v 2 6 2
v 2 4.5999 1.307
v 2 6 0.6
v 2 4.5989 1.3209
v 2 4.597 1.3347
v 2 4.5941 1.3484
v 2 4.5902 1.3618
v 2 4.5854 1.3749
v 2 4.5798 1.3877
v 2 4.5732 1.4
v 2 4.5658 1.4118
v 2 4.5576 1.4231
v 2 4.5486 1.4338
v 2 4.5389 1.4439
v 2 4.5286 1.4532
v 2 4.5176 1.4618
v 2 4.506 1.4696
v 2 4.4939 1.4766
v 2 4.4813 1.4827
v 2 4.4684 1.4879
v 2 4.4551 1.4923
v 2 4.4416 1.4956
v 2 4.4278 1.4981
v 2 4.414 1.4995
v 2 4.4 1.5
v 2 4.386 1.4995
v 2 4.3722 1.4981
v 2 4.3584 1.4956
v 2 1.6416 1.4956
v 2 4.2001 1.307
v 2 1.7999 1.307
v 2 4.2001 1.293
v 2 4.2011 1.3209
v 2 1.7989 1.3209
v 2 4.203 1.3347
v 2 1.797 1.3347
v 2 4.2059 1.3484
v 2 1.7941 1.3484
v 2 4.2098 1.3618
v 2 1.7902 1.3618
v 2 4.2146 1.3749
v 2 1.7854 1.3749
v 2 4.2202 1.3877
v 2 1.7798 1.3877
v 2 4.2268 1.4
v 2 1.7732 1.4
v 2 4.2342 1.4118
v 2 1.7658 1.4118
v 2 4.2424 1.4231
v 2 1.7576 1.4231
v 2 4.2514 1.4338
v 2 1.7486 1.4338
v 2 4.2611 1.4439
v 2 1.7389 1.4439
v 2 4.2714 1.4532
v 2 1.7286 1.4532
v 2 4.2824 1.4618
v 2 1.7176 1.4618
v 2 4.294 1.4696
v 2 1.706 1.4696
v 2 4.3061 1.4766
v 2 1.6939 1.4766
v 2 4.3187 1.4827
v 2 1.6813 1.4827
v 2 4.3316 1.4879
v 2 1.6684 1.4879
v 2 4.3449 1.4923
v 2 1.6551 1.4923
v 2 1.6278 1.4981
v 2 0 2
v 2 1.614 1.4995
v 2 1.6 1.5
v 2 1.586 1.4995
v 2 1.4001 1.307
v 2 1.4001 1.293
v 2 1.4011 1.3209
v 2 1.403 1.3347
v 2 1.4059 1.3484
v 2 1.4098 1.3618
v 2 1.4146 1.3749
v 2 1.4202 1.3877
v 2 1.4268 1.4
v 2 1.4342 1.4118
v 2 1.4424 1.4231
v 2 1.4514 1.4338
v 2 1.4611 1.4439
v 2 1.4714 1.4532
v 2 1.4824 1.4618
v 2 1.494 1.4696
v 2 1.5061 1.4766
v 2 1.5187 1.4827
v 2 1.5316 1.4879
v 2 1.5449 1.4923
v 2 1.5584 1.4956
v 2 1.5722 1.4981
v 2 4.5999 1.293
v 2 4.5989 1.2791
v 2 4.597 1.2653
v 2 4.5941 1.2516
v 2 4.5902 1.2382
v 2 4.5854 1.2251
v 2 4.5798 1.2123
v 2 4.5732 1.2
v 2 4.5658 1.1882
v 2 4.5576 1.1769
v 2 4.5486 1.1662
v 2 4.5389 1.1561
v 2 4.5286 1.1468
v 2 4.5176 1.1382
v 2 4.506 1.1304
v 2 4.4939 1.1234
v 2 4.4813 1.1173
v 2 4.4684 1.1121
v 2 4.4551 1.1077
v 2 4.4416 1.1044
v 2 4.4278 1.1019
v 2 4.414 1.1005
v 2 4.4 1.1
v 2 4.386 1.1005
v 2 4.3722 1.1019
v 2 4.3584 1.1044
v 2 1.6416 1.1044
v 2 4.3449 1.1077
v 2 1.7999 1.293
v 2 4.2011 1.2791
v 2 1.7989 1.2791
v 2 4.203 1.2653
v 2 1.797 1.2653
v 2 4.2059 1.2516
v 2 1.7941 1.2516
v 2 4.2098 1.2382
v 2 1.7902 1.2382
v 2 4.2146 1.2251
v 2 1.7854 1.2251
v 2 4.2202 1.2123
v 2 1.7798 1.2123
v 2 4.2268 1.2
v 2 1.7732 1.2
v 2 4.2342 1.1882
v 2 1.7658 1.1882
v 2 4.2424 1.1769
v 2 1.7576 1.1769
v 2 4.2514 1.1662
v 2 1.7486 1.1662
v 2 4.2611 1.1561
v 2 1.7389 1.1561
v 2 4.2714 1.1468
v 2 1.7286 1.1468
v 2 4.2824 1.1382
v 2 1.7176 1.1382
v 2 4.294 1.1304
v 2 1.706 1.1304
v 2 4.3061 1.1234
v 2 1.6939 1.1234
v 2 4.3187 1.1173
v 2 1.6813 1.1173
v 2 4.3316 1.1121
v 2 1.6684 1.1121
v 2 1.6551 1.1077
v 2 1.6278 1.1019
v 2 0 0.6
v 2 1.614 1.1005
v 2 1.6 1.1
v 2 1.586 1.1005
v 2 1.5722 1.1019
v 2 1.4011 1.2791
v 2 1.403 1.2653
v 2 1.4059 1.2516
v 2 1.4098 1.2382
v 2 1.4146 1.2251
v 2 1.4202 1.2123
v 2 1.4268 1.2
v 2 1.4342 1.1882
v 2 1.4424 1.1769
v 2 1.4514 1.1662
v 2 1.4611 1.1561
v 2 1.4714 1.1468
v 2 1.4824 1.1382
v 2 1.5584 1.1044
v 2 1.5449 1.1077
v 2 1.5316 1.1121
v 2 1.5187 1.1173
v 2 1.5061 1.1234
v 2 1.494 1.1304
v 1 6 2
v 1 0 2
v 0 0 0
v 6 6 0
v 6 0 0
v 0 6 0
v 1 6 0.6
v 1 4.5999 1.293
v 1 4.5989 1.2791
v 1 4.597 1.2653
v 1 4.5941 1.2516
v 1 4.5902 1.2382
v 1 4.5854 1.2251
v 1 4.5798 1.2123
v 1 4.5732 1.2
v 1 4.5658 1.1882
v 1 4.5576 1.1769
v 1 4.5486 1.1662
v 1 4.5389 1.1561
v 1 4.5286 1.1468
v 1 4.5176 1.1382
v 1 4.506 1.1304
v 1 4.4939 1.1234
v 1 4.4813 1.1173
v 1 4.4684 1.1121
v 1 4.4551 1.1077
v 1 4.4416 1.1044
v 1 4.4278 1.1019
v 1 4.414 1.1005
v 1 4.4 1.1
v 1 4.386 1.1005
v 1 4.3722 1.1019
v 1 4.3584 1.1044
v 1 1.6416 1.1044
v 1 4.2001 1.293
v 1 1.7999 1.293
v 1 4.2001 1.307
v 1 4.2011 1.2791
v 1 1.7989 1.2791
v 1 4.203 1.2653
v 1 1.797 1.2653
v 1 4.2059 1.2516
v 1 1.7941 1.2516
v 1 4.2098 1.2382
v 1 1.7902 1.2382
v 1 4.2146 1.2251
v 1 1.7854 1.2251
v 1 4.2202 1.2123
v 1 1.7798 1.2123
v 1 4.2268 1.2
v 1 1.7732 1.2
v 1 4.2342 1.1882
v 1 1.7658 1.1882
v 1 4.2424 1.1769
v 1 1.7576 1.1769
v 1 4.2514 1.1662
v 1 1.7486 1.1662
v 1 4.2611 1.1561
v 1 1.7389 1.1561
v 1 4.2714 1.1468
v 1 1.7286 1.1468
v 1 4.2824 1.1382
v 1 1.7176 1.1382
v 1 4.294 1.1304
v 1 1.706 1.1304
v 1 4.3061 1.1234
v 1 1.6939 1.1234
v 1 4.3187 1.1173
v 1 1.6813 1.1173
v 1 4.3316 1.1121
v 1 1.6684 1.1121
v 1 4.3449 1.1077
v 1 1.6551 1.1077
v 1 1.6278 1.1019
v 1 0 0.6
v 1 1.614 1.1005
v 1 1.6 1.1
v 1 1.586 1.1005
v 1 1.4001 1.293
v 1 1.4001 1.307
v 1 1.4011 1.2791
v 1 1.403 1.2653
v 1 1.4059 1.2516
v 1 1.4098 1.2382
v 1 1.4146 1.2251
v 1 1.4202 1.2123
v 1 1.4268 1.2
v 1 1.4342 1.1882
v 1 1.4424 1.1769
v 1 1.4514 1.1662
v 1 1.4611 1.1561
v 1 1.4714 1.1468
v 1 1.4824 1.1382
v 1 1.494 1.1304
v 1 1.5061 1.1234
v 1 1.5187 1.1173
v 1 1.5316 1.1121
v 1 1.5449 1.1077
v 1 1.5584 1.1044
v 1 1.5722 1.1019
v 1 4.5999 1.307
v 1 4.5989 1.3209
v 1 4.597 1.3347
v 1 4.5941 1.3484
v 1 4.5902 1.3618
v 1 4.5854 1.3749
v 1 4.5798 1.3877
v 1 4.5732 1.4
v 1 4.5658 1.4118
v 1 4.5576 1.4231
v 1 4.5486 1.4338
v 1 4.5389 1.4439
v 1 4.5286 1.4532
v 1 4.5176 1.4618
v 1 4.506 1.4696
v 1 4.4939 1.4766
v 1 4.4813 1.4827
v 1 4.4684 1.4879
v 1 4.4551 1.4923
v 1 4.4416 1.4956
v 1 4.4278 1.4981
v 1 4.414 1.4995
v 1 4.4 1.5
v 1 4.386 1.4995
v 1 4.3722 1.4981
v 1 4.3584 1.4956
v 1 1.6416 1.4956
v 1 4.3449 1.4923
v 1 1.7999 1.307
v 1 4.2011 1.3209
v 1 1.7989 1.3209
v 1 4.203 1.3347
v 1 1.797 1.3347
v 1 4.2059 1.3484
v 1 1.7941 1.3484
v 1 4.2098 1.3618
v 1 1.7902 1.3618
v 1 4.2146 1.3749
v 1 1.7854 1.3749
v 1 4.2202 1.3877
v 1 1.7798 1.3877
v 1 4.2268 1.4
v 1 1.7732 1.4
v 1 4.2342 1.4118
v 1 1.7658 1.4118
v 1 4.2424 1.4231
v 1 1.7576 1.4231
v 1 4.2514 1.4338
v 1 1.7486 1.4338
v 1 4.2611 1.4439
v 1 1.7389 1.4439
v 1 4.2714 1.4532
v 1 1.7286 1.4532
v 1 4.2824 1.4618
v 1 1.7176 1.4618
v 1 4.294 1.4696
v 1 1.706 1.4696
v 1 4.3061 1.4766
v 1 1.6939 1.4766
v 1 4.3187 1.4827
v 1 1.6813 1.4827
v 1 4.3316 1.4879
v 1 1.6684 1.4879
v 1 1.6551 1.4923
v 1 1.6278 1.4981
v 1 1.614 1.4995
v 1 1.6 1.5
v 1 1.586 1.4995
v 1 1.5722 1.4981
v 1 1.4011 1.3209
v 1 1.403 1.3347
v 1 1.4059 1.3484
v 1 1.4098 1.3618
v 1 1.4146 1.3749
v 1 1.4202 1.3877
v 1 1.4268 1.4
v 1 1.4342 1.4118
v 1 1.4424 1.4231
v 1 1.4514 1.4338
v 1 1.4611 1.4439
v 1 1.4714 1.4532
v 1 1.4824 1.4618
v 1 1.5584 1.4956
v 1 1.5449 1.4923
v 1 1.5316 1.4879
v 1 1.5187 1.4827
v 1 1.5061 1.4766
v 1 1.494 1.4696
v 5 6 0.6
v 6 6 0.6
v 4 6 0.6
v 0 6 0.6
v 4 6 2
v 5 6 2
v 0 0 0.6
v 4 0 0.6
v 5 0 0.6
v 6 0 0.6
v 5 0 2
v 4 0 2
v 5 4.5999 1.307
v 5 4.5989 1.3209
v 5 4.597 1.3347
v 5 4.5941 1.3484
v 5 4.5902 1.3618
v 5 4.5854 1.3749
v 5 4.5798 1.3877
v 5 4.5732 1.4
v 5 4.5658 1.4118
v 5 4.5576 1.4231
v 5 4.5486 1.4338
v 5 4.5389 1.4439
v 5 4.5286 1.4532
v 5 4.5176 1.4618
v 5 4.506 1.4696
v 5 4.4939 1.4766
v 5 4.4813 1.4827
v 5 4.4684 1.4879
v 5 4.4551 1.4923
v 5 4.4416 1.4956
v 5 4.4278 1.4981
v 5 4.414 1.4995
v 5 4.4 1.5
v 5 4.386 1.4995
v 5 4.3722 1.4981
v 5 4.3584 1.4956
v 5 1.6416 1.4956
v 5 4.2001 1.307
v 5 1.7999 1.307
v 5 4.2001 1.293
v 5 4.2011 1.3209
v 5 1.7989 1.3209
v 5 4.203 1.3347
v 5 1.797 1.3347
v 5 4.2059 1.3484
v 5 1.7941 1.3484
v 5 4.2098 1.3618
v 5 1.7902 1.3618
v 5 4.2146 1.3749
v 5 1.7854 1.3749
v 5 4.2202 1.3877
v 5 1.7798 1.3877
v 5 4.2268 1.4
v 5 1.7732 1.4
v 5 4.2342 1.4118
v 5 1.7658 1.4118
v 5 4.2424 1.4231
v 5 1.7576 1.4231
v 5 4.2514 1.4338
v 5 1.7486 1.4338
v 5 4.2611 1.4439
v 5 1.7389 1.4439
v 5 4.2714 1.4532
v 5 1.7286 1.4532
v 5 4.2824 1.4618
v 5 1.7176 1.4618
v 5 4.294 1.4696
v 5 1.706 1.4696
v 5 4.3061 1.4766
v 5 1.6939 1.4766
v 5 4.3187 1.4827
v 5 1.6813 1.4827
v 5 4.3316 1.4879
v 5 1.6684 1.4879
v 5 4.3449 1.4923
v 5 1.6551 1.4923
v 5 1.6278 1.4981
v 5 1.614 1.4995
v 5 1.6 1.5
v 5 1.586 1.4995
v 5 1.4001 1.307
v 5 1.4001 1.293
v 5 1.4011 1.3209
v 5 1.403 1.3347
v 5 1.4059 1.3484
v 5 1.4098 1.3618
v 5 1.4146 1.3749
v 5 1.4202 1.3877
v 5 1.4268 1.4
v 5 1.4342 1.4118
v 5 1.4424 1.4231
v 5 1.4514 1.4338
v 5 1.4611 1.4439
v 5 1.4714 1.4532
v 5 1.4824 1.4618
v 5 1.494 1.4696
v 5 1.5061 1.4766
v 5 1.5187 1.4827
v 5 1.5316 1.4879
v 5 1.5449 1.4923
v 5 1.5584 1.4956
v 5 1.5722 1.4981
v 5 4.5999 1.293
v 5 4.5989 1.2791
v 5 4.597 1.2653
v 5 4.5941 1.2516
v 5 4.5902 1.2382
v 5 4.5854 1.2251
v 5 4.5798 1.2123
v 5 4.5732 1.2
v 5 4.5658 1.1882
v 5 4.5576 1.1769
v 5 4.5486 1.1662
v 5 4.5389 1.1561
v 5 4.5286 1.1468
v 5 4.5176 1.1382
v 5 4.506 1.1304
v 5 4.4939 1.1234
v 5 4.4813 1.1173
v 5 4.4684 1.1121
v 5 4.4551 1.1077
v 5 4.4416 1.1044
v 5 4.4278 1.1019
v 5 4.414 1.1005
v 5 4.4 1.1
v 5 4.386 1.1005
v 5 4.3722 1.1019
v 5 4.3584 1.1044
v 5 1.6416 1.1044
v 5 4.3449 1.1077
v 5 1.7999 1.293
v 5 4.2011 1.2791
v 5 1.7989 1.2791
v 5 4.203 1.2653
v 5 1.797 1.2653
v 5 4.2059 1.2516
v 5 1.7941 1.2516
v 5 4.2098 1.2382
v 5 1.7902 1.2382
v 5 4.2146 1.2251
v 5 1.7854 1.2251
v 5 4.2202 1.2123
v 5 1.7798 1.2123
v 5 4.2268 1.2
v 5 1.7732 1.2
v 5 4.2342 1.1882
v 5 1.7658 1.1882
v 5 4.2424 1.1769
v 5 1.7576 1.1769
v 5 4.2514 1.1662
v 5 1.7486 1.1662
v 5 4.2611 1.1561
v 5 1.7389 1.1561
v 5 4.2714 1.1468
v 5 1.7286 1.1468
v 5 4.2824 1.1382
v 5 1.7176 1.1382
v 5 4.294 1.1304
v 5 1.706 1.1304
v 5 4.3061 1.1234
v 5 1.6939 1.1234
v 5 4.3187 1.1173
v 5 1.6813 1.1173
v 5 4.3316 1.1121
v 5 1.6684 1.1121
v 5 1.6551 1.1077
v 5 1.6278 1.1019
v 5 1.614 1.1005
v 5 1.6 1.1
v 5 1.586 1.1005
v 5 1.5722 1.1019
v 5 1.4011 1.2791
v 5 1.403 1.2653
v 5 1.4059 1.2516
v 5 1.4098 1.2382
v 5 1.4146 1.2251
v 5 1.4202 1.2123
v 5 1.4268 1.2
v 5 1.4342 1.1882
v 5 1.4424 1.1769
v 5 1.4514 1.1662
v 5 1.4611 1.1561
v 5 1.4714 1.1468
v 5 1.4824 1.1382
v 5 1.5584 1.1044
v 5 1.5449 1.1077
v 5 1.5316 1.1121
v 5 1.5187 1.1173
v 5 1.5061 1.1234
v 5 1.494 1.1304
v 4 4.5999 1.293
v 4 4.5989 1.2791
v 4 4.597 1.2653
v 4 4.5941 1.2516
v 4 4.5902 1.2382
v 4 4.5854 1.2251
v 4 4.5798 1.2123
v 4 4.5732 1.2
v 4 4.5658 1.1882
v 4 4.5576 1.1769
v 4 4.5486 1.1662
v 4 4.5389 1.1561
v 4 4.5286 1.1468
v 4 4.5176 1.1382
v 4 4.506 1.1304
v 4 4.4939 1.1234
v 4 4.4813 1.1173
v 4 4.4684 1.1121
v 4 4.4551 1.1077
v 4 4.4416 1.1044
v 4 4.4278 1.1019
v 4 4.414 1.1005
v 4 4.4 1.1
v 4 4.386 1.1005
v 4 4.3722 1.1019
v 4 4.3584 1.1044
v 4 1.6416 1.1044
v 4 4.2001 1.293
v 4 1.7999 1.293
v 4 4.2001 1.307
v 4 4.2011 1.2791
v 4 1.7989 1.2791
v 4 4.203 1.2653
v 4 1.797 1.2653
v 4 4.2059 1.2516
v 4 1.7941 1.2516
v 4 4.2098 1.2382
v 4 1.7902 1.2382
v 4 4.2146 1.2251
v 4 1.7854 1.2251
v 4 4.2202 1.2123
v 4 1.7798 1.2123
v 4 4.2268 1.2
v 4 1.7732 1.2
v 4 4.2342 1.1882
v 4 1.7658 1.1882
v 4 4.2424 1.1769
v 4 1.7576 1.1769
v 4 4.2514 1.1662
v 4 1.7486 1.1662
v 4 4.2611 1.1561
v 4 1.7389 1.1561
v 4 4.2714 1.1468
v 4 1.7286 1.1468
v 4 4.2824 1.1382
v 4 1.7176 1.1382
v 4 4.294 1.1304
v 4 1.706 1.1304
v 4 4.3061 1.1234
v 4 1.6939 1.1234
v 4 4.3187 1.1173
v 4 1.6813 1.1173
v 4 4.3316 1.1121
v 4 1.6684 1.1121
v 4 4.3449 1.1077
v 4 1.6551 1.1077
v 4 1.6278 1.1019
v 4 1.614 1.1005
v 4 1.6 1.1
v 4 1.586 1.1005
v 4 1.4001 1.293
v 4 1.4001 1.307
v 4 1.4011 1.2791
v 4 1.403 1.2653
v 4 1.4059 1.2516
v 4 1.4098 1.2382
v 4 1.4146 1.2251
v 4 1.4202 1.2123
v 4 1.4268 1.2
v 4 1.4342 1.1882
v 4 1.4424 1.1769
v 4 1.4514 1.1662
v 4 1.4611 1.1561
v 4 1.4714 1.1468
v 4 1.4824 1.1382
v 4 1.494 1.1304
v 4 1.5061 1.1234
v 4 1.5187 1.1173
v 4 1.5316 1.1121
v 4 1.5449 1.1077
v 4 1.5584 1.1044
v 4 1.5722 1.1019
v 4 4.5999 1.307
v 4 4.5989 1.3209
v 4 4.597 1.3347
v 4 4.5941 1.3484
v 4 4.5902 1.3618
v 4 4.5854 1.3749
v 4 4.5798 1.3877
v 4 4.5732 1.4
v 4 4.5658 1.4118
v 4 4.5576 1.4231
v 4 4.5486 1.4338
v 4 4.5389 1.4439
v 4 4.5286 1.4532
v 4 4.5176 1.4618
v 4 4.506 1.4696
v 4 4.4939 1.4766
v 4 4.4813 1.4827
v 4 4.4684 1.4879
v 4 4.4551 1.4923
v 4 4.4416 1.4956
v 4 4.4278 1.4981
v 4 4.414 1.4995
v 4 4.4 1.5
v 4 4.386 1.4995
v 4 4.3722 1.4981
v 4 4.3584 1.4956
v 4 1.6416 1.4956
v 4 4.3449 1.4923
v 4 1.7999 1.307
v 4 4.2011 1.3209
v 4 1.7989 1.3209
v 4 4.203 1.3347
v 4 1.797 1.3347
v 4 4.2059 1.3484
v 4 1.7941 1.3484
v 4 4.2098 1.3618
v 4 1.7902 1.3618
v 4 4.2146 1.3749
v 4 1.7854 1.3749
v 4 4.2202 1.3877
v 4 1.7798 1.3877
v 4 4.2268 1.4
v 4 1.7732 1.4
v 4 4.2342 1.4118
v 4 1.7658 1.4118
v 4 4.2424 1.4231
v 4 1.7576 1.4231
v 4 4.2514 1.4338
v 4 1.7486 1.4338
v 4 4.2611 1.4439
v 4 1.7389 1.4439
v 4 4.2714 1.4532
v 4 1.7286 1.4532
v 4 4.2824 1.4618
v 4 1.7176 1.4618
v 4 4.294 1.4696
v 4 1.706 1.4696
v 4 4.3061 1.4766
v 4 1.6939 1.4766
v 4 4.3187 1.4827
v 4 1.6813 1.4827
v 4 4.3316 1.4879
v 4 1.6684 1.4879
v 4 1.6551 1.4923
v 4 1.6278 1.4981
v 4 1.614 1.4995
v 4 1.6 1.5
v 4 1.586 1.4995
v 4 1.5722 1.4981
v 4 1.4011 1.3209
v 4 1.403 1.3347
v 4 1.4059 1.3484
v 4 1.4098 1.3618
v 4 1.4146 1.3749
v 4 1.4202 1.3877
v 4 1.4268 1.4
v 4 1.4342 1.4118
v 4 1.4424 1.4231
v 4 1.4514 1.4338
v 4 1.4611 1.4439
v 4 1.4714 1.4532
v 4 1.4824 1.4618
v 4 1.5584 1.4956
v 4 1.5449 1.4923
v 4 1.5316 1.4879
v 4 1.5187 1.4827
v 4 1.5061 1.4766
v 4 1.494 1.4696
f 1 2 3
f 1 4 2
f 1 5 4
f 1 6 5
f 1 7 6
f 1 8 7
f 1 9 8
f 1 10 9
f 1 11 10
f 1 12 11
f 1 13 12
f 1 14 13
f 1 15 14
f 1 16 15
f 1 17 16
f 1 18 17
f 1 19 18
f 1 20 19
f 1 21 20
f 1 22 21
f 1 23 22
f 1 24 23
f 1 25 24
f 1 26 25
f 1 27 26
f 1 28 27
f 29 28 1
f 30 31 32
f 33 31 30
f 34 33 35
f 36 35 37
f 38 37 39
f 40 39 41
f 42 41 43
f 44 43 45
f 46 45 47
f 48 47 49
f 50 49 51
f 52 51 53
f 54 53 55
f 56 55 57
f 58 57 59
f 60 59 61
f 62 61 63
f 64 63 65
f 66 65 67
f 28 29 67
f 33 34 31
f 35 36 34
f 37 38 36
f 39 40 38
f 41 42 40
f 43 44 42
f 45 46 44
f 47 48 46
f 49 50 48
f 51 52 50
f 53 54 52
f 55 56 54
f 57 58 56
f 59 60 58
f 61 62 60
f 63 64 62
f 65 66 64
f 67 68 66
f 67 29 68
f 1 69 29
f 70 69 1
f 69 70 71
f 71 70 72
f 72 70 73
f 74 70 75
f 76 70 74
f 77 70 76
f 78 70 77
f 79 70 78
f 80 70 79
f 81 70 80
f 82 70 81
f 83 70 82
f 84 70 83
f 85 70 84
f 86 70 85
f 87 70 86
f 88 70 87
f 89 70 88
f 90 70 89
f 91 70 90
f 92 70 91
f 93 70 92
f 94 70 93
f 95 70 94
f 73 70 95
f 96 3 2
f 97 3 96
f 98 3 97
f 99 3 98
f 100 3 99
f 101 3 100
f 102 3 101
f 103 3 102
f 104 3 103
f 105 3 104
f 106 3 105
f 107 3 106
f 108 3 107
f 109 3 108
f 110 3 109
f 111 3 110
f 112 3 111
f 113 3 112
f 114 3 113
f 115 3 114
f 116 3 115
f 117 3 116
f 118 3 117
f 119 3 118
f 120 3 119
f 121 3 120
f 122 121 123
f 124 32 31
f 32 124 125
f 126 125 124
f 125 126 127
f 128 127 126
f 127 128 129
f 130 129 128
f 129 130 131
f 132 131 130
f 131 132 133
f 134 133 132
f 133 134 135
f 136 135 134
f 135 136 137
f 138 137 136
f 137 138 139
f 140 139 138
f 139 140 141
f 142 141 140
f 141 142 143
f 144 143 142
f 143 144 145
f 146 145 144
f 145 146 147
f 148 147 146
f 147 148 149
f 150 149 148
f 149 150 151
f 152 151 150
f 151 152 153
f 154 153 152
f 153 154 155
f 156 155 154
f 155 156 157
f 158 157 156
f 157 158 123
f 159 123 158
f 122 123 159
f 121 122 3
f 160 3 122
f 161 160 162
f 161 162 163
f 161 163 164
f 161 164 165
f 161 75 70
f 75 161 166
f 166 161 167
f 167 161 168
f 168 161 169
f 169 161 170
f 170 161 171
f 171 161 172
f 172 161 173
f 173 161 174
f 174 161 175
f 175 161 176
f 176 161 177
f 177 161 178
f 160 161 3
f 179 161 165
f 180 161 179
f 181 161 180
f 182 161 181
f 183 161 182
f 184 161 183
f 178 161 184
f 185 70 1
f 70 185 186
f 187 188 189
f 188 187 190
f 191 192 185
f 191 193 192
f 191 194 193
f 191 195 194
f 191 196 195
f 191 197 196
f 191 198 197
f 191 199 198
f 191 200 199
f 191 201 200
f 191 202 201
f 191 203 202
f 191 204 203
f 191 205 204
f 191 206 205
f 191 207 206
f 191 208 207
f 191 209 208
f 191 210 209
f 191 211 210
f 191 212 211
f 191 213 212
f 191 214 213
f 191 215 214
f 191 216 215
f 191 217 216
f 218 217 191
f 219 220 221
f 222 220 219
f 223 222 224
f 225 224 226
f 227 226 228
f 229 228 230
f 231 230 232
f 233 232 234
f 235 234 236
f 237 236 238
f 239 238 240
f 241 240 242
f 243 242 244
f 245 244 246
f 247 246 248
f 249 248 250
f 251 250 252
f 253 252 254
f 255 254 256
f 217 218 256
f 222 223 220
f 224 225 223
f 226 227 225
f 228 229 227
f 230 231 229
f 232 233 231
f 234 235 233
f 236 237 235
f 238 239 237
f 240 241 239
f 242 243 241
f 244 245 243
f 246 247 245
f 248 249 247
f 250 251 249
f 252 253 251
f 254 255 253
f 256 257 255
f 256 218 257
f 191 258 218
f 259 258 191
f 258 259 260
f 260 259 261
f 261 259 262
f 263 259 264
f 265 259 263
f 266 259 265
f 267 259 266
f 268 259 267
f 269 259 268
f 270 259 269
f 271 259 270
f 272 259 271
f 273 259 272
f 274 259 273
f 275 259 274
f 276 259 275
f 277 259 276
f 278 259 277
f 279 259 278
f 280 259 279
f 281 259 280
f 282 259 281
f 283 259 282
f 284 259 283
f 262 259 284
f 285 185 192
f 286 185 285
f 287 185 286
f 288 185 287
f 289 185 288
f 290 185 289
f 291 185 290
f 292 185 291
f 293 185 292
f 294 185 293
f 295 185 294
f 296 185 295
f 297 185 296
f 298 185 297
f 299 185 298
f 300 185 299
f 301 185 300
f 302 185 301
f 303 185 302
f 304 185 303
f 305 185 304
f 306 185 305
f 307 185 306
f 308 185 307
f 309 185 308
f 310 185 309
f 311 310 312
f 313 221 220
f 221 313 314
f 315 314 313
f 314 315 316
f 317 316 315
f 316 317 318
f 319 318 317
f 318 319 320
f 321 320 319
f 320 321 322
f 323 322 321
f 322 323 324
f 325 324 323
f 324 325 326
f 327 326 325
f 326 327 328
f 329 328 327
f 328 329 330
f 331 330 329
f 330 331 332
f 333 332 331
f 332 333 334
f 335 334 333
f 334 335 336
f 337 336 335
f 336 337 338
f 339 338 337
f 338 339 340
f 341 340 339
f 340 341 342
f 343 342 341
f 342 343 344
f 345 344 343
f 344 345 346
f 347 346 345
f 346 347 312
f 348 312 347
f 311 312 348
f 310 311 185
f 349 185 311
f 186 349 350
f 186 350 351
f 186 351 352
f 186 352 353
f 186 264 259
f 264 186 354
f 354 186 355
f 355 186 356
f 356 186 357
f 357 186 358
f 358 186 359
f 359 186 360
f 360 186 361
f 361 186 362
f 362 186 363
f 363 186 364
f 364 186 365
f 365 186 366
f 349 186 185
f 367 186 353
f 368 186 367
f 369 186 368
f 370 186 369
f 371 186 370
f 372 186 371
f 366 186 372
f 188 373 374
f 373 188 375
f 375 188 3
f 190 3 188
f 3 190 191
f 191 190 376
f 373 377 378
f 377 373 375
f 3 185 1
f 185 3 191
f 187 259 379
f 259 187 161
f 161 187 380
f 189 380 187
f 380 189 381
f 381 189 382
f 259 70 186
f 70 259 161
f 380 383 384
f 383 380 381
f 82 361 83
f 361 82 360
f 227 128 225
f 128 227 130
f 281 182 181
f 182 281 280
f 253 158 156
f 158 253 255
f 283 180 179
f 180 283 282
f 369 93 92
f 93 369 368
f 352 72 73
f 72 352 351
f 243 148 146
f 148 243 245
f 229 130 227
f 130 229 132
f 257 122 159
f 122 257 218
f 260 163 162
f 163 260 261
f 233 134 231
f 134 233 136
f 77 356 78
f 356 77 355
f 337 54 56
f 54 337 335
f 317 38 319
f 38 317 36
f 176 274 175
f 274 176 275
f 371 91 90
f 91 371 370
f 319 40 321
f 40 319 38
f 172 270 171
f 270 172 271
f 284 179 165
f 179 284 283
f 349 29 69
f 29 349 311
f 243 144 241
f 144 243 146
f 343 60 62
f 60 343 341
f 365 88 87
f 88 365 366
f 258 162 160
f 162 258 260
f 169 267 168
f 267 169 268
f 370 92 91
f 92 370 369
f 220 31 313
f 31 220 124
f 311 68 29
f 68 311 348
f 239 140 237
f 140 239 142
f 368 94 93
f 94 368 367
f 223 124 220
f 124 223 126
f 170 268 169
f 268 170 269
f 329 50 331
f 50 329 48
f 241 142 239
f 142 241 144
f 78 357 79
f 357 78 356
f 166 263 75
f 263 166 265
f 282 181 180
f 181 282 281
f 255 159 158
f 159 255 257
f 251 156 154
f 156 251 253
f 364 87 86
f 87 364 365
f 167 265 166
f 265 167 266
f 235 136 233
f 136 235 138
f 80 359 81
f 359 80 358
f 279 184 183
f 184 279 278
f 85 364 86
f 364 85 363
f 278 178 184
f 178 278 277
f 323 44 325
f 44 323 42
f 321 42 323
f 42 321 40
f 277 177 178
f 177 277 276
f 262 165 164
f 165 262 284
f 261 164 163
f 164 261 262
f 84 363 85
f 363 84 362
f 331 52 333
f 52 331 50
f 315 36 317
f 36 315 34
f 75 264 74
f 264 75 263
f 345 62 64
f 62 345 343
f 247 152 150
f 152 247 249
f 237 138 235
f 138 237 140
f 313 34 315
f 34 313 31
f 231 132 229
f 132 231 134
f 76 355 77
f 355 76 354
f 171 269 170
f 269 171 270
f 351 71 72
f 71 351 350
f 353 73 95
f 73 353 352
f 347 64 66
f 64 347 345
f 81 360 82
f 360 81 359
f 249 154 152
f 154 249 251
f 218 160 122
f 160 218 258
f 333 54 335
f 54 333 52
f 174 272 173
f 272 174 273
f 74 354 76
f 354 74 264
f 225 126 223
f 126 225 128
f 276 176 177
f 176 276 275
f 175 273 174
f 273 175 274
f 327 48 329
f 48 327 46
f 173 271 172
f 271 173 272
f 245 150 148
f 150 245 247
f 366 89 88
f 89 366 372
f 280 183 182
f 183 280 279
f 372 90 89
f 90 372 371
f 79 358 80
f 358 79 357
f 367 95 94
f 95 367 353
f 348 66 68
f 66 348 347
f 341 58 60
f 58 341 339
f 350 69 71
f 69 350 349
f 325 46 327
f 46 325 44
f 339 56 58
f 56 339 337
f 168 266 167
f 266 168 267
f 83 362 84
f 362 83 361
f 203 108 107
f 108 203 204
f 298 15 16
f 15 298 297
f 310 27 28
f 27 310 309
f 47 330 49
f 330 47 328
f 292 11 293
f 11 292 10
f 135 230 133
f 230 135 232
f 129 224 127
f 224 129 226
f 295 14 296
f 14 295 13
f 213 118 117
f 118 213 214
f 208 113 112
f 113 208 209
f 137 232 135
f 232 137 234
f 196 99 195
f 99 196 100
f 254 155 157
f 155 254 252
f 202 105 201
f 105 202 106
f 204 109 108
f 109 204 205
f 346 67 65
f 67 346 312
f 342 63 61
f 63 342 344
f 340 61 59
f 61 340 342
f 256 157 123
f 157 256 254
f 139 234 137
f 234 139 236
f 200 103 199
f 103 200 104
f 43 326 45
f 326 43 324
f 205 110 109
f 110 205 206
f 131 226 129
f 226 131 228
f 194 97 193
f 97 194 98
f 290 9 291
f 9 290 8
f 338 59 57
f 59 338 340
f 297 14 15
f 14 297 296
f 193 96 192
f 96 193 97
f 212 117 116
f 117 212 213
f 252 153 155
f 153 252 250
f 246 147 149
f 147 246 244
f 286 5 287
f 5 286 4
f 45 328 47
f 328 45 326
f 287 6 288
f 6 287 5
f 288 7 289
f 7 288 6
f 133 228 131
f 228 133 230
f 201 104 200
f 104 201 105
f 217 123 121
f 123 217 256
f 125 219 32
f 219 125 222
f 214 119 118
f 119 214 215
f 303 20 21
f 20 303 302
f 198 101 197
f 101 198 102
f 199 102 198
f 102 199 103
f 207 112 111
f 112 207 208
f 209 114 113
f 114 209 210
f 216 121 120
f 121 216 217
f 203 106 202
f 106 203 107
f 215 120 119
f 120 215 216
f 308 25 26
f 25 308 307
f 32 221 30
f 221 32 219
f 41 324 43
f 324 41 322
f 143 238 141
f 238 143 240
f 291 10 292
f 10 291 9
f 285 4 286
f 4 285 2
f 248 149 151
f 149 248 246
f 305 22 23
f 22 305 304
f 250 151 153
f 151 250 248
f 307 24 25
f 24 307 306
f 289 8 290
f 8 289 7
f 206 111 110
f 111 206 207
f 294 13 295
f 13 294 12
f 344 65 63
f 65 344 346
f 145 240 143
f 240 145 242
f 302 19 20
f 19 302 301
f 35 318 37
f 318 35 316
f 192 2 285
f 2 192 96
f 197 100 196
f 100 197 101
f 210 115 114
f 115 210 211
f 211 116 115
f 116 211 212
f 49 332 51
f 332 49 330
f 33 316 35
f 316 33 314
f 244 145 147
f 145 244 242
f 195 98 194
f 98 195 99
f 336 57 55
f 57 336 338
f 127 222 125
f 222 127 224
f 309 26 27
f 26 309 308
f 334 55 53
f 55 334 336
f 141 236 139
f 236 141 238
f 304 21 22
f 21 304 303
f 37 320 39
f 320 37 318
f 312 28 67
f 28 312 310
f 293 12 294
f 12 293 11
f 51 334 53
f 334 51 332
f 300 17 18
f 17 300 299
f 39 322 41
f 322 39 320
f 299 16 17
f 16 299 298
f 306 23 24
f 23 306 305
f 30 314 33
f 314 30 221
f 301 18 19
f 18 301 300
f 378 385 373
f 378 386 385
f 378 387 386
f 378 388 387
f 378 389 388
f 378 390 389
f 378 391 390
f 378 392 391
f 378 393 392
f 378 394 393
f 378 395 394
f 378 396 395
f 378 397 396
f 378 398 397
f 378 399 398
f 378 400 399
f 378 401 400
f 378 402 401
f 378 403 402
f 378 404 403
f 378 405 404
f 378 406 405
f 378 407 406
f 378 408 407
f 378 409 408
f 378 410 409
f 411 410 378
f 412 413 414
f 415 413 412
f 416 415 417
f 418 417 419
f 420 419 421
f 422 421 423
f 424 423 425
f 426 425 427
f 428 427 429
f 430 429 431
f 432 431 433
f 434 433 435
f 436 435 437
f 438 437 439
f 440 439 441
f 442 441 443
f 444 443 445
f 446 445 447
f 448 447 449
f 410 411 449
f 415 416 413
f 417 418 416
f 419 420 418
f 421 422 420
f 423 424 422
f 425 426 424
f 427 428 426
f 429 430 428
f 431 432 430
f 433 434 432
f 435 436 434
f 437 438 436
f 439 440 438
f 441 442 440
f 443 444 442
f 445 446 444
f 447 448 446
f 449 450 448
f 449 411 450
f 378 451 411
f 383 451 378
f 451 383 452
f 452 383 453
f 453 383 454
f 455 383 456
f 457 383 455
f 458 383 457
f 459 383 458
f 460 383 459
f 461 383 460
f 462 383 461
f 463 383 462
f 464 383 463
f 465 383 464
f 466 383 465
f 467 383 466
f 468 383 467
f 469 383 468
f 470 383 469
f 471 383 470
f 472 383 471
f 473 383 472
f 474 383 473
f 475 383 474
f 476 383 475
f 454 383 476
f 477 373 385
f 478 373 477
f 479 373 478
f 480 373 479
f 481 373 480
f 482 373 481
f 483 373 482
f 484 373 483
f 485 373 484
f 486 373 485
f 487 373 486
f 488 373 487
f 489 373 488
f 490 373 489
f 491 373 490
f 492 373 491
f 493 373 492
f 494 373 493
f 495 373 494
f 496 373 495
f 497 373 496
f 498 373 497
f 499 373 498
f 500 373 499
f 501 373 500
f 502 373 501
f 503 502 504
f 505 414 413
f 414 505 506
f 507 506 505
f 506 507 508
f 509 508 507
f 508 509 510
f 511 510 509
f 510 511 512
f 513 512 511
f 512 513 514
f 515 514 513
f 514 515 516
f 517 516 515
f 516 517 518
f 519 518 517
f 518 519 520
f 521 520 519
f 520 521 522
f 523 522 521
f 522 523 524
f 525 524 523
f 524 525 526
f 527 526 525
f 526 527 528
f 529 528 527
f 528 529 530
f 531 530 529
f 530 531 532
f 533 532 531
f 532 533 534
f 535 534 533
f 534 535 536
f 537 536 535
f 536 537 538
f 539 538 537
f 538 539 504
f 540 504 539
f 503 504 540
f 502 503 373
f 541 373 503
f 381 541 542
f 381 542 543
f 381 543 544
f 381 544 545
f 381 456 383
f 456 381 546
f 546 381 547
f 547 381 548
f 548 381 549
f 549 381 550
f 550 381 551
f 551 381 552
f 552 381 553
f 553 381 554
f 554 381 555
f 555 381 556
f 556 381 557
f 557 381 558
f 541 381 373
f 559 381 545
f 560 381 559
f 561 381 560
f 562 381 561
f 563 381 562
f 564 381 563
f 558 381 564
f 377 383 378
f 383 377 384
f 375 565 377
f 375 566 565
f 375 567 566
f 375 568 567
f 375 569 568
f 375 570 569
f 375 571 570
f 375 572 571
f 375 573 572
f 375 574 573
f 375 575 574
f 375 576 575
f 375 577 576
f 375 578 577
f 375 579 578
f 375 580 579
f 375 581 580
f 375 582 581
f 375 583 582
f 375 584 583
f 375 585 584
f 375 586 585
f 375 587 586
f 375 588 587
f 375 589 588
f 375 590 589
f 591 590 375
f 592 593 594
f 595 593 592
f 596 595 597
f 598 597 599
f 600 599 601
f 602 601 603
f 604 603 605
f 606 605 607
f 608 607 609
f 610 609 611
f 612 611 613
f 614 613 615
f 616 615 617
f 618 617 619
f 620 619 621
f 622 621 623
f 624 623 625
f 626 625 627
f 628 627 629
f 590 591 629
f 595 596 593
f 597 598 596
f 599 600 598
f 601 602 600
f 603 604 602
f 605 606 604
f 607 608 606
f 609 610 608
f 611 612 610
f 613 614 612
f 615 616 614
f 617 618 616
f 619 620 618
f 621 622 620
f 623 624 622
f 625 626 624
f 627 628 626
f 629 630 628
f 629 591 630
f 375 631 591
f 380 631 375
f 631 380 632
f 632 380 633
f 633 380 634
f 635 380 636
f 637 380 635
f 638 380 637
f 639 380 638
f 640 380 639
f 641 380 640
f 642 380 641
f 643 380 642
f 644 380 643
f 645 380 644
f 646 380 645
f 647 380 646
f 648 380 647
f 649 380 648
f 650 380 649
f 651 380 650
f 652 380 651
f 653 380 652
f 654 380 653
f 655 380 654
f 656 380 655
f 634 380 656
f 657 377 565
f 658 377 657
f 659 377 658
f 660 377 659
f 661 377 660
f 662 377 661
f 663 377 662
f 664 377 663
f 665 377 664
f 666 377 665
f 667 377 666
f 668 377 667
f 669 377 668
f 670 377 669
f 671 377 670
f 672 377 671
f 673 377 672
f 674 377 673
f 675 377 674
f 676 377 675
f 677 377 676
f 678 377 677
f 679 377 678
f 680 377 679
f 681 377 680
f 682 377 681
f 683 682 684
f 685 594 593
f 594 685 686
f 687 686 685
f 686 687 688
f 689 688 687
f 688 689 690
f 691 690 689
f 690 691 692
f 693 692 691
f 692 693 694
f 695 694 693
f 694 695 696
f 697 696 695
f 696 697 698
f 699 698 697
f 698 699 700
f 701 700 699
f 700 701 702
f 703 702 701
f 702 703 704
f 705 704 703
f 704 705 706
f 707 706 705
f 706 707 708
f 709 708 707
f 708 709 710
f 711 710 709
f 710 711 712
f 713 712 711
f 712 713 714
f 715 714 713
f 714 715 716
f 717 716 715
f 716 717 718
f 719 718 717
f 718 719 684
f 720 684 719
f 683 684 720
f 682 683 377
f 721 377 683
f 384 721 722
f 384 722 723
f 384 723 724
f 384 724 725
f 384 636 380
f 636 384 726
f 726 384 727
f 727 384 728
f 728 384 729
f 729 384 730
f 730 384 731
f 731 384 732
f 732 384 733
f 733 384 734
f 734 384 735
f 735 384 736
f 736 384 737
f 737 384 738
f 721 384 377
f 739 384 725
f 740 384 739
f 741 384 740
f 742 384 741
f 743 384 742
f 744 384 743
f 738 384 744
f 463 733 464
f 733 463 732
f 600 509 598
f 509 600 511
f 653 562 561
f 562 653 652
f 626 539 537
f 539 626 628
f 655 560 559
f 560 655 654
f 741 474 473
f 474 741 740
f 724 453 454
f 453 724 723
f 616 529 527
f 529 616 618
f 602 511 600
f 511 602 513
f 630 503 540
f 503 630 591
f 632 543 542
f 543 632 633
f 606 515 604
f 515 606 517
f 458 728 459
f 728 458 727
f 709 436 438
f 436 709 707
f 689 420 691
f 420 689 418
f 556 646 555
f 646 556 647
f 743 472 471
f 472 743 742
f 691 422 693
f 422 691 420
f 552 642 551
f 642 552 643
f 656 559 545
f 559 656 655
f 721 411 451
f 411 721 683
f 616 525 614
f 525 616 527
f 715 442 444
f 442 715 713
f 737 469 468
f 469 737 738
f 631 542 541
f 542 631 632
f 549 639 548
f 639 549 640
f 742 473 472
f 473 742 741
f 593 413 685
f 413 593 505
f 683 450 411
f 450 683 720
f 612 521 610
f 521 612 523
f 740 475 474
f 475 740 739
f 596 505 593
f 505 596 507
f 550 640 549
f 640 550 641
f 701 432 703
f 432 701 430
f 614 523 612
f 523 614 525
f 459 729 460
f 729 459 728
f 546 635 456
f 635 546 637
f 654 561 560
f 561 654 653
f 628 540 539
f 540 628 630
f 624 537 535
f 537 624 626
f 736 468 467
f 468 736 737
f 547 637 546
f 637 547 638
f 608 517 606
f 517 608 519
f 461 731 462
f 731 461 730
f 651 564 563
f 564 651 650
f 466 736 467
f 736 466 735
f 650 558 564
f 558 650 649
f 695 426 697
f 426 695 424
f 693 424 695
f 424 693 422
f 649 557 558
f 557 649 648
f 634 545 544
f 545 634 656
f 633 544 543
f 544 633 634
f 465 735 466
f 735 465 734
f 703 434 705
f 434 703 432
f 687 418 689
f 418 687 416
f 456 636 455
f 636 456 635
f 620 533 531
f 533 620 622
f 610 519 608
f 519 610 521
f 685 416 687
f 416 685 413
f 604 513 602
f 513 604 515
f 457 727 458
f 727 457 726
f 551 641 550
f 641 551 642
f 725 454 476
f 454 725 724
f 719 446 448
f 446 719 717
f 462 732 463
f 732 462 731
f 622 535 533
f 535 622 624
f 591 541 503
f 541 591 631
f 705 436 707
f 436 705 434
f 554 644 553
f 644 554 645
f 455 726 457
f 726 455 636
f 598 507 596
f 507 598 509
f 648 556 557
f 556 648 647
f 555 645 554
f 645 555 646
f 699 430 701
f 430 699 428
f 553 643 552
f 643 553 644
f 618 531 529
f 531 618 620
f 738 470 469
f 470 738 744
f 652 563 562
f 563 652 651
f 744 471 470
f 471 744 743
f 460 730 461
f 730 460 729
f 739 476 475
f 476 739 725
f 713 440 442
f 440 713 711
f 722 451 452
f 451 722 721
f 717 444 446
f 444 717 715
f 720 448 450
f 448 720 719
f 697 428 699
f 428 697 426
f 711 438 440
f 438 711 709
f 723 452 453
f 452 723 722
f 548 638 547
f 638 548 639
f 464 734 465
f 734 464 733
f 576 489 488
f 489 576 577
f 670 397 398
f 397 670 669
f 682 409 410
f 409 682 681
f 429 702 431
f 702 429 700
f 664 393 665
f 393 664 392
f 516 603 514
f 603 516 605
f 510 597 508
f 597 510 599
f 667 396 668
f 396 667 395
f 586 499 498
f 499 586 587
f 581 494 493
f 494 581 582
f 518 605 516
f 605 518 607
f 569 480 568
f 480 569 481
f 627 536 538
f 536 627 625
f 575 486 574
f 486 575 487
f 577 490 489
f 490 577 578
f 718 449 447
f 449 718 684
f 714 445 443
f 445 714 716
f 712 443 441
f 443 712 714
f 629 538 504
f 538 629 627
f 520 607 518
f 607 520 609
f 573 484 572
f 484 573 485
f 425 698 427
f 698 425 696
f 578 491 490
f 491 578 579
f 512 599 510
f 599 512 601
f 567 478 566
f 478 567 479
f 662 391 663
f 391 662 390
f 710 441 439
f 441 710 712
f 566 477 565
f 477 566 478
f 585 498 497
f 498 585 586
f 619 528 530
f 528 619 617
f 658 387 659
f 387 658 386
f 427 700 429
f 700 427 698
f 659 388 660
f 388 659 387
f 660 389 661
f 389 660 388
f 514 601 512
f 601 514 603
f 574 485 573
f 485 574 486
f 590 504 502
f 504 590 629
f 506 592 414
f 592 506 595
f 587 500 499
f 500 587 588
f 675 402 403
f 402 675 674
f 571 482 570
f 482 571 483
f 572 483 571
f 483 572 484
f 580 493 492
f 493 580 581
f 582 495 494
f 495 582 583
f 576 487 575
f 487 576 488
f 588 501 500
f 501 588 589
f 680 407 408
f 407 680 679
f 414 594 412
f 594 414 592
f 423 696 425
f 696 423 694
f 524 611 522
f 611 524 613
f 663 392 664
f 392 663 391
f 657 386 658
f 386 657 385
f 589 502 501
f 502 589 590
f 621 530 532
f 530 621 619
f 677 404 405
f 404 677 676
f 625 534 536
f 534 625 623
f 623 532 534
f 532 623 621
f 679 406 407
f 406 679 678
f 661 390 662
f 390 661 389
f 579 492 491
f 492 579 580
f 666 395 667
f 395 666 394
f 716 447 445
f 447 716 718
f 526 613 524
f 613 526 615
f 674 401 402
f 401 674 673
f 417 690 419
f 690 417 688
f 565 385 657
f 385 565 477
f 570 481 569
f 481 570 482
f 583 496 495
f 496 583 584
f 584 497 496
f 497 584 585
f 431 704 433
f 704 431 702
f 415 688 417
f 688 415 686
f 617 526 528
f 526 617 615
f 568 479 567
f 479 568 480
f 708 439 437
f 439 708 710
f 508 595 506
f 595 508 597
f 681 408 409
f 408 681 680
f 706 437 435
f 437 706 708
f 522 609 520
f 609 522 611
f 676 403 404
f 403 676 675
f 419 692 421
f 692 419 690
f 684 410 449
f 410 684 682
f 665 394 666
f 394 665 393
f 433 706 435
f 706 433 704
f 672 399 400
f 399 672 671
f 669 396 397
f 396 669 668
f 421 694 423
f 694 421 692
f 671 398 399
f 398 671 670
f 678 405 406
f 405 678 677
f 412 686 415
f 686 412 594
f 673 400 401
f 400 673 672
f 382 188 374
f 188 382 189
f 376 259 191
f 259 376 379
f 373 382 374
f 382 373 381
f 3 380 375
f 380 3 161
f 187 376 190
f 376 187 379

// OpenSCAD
cube([6,6,0.6]);

difference() {
    translate([1,0,0]) {
        cube([1,6,2]);
    }
    translate([0,1.6,1.3]) {
        rotate([0,90,0]) {
            cylinder(10,0.2,0.2, $fn=90);
        }
    }
     translate([0,4.4,1.3]) {
        rotate([0,90,0]) {
            cylinder(10,0.2,0.2, $fn=90);
        }
    }
}

difference (){
    translate([4,0,0]) {
        cube([1,6,2]);
    }
    
    translate([0,1.6,1.3]) {
        rotate([0,90,0]) {
            cylinder(10,0.2,0.2, $fn=90);
        }
    }
    
    translate([0,4.4,1.3]) {
        rotate([0,90,0]) {
            cylinder(10,0.2,0.2, $fn=90);
        }
    }
}
